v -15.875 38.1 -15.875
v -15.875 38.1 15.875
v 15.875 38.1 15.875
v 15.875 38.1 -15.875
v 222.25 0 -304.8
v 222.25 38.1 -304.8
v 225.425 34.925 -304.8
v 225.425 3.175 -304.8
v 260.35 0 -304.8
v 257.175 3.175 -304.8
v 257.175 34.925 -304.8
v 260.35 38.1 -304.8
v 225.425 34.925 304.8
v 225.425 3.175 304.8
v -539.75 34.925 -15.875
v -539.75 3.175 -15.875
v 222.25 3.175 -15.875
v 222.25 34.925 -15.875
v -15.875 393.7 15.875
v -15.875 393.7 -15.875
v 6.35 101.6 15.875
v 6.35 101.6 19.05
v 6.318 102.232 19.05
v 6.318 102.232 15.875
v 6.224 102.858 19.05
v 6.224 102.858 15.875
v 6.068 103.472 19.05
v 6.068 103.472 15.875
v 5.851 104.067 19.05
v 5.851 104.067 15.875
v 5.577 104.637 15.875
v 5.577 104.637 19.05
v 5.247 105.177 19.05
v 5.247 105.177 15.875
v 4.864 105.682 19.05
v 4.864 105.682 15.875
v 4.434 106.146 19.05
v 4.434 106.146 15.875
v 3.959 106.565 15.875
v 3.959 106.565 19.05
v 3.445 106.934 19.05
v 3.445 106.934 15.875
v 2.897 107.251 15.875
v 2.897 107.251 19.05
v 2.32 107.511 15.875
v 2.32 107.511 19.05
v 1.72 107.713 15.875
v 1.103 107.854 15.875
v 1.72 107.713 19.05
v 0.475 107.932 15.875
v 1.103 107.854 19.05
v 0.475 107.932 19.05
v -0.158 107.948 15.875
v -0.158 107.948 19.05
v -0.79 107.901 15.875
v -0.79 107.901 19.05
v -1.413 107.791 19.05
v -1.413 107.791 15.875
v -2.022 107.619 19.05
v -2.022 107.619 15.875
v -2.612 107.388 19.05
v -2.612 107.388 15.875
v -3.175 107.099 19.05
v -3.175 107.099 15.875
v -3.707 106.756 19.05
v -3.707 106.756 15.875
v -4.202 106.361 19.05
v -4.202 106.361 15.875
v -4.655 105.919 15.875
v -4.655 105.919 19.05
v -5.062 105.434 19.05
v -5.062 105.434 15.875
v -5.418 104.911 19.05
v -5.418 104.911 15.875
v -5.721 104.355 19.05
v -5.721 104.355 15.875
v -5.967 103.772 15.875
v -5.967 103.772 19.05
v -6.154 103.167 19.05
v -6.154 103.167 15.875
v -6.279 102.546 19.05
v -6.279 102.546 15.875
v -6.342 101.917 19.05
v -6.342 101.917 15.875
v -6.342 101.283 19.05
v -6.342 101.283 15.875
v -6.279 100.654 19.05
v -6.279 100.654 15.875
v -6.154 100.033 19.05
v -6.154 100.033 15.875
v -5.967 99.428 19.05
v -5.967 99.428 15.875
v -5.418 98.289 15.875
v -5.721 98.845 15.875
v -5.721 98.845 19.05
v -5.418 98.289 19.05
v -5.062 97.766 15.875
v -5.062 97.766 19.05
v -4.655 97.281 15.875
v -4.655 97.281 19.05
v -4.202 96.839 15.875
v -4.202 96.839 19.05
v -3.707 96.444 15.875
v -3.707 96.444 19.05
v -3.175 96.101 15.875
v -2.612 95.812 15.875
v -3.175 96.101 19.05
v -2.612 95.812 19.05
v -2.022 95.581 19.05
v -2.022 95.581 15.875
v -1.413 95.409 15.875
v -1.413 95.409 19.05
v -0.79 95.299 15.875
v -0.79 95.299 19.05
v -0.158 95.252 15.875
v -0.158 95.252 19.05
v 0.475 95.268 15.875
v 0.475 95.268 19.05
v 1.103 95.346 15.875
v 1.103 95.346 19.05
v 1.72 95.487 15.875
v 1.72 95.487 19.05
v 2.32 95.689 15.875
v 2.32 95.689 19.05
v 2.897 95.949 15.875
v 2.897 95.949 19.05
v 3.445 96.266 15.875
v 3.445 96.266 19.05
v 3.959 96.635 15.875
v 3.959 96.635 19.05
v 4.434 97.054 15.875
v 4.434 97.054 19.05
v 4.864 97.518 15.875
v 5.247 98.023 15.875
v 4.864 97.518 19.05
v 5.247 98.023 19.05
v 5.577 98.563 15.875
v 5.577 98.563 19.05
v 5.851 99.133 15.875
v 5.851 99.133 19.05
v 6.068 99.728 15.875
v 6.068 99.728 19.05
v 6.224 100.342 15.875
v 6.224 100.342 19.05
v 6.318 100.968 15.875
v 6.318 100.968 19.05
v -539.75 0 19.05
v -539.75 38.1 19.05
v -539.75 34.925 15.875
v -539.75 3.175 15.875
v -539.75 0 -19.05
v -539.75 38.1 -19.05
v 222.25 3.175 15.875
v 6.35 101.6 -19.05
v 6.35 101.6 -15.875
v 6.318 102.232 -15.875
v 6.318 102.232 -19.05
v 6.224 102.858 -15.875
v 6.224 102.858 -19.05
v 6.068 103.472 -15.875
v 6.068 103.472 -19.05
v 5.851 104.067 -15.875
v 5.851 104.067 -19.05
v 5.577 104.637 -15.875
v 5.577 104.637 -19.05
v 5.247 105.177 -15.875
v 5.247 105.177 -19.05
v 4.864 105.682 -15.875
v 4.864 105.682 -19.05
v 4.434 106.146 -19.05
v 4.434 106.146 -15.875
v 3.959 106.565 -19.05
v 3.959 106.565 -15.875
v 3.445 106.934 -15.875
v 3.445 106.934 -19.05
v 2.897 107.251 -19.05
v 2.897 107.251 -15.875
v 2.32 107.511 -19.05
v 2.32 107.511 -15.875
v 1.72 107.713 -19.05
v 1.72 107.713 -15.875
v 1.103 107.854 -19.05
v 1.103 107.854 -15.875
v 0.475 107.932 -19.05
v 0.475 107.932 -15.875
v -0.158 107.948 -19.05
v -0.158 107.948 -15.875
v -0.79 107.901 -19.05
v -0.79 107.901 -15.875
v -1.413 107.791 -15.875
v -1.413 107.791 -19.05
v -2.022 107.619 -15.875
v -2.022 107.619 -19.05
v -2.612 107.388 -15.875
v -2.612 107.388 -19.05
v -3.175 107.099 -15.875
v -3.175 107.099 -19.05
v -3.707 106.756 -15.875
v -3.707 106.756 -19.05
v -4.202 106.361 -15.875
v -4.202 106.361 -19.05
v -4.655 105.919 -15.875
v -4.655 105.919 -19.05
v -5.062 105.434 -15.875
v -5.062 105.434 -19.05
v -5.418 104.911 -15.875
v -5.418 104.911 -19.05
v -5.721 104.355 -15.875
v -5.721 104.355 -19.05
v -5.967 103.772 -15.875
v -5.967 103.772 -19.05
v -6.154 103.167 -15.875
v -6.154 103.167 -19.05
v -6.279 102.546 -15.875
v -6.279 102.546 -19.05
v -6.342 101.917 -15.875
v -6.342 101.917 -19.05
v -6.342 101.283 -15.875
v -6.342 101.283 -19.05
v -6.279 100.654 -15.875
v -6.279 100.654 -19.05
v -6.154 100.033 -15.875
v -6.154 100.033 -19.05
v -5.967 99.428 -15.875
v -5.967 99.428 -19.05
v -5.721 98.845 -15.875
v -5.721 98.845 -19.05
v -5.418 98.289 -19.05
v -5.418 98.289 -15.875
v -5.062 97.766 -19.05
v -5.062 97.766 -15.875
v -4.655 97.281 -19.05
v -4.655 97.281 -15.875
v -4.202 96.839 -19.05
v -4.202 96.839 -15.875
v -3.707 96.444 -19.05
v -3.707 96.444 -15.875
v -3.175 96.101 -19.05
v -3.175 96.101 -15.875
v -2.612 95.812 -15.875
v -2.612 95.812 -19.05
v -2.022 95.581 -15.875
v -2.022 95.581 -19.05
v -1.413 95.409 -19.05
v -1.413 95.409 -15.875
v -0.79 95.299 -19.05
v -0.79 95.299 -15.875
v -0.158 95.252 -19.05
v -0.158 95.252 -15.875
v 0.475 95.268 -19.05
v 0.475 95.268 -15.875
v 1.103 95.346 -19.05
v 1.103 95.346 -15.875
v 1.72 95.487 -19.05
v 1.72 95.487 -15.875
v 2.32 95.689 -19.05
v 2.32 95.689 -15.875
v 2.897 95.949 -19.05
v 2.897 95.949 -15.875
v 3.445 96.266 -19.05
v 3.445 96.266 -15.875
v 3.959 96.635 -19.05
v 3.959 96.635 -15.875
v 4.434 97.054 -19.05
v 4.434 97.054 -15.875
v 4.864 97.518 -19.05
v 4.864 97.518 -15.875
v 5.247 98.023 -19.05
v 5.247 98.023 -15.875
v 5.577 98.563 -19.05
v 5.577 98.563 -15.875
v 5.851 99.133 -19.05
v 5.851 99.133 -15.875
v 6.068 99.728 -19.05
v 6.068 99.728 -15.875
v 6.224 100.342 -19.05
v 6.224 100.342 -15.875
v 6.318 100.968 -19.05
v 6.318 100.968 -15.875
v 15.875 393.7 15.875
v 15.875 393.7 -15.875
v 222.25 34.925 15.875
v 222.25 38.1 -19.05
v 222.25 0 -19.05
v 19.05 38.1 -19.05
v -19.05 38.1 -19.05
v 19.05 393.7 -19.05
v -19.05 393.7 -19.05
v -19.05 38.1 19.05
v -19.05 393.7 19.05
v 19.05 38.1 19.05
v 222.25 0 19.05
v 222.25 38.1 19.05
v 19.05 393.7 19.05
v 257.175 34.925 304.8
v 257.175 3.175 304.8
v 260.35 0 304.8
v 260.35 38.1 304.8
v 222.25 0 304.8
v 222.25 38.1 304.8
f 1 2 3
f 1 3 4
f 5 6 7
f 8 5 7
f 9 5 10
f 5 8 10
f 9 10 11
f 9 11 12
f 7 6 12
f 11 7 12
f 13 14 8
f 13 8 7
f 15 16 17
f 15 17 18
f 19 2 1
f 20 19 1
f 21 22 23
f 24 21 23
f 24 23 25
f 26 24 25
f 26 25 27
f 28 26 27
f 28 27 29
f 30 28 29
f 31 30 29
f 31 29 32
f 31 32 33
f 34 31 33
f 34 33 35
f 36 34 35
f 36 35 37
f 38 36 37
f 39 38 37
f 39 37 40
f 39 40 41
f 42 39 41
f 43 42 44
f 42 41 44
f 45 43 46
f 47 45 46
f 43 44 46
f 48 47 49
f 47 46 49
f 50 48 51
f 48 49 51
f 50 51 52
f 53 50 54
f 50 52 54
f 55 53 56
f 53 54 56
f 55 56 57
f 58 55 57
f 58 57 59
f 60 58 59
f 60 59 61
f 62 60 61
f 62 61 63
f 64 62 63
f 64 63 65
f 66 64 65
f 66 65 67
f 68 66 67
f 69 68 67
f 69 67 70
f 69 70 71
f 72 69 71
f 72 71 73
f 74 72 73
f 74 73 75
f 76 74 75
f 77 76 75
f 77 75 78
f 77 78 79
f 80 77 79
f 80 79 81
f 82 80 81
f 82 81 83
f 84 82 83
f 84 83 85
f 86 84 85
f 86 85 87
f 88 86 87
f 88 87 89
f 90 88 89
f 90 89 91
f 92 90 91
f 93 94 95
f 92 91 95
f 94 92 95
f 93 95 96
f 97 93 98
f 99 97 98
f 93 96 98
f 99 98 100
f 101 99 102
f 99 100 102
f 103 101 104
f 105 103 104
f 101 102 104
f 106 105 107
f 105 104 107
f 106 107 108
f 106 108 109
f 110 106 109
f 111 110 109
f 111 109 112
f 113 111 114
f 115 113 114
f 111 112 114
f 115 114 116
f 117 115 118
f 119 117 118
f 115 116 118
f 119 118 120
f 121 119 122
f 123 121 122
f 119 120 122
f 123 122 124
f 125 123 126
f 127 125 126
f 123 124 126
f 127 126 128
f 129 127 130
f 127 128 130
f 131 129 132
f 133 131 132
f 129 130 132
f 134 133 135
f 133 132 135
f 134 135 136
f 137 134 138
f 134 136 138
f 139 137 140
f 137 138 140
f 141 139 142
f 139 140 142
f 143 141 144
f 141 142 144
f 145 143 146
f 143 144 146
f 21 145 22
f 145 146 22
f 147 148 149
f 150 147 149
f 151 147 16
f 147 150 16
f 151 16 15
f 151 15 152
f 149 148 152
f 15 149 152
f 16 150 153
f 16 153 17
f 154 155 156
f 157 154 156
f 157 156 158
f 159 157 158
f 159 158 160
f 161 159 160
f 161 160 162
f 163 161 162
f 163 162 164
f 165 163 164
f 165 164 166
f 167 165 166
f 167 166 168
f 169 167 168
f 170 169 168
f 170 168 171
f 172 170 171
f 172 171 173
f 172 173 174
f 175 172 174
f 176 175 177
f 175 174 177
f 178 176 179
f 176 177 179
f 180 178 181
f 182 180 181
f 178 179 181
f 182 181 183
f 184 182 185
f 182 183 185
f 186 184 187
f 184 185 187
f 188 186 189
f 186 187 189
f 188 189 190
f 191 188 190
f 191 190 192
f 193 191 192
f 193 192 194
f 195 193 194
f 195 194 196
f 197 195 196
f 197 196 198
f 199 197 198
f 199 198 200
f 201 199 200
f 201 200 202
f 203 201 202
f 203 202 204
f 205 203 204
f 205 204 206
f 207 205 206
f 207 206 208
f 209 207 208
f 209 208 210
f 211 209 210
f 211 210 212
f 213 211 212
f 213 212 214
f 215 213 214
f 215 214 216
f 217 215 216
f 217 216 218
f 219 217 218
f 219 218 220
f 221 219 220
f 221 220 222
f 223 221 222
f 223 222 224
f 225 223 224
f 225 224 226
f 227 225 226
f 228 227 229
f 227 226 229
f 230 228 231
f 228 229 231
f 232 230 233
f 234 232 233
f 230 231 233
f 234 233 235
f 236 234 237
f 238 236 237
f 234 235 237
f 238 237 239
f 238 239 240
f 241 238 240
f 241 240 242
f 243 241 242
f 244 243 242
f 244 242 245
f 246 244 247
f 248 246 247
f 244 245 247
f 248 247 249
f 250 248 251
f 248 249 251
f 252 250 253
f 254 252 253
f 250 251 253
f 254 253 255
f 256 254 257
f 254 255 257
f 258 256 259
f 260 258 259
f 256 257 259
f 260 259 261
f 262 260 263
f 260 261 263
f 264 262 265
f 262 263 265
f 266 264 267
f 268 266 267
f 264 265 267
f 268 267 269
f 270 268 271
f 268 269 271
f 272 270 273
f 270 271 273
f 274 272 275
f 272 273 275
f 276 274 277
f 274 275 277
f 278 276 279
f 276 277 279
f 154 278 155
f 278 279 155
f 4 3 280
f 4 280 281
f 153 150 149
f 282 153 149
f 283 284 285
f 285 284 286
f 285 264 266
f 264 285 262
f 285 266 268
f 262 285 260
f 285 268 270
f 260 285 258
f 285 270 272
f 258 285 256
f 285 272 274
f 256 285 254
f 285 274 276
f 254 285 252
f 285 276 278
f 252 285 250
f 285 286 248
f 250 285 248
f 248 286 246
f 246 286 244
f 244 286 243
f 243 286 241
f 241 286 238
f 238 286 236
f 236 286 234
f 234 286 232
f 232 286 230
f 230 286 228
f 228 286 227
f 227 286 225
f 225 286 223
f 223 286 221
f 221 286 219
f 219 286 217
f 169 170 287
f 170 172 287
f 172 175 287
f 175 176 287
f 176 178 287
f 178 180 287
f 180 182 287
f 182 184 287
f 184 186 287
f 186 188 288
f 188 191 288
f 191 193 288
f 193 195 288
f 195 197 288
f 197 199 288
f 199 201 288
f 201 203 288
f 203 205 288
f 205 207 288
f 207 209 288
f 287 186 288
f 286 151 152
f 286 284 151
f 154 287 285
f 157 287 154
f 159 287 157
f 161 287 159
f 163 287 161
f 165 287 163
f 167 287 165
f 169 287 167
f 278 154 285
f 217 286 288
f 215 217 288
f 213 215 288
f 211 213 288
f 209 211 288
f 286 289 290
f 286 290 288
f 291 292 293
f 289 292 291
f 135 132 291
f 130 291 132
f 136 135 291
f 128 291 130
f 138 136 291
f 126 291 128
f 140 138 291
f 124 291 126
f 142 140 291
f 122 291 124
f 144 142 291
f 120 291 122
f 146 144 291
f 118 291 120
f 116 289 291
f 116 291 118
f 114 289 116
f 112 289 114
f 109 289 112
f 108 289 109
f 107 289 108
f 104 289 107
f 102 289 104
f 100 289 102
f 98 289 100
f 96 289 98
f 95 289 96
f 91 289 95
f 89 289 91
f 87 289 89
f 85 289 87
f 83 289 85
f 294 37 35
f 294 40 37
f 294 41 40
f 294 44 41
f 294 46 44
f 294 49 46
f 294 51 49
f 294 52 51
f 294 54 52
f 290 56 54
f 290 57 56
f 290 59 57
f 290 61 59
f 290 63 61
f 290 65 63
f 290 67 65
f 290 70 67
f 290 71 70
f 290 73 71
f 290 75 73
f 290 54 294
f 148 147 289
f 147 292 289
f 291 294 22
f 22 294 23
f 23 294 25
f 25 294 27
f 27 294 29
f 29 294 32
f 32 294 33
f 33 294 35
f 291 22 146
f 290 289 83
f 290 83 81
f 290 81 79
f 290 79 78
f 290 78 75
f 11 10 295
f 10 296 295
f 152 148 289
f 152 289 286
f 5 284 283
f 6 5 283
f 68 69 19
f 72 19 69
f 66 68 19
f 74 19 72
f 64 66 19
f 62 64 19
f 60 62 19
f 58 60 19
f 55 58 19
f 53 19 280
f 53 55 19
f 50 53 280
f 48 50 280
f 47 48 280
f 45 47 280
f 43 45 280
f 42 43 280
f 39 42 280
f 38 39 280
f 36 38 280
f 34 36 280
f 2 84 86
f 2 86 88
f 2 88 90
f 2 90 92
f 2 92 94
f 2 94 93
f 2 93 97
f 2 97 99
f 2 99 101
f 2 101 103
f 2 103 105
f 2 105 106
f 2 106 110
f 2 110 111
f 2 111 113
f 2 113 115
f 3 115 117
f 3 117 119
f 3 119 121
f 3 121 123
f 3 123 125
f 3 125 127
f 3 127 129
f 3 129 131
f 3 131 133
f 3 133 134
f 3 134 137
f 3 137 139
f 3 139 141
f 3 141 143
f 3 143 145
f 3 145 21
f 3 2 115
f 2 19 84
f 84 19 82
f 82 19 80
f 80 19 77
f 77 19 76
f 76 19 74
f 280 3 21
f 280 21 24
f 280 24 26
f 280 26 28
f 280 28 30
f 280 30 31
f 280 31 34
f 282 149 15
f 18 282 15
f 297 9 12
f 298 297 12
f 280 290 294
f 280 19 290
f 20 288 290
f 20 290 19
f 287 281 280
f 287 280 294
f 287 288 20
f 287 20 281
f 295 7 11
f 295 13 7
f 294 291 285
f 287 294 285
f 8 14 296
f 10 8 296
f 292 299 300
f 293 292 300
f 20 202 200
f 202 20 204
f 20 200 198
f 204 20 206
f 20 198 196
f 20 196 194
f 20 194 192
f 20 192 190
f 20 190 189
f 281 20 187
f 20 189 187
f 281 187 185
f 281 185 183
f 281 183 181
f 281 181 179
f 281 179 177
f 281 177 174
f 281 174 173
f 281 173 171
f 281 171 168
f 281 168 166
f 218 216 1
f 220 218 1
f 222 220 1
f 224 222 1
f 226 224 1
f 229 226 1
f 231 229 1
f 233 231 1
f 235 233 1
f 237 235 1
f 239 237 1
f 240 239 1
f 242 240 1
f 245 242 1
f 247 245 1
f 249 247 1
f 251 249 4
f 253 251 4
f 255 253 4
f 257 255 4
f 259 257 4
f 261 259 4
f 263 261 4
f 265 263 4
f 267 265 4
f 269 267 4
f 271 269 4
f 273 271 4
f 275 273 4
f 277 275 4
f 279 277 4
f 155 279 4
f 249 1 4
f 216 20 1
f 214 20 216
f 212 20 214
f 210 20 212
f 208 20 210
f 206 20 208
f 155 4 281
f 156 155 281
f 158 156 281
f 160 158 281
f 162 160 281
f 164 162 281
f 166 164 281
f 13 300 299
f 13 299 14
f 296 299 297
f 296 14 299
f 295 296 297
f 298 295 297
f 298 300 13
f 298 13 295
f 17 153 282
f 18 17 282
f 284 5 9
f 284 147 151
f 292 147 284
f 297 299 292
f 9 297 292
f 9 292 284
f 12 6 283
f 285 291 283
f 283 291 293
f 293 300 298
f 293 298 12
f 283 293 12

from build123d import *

# Parameters (mm, degrees)
BOSS_EXTRUDE2_DEPTH      = 222.25
BOSS_EXTRUDE2_DEPTH_BACK = 539.75
SKETCH1_W                = 38.1
SKETCH1_H                = 38.1
SKETCH1_W_2              = 31.75
SKETCH1_H_2              = 31.75
SKETCH2_W                = 38.1
SKETCH2_H                = 38.1
SKETCH2_W_2              = 31.75
SKETCH2_H_2              = 31.75
BOSS_EXTRUDE3_DEPTH      = 355.6
SKETCH3_W                = 38.1
SKETCH3_H                = 38.1
SKETCH3_W_2              = 31.75
SKETCH3_H_2              = 31.75
BOSS_EXTRUDE4_DEPTH      = 304.8
SKETCH4_R                = 6.35
CUT_EXTRUDE1_DEPTH       = 743.434222676


with BuildPart() as part:
    # Sketch1 → Boss-Extrude2 (new, two sides: drawn at the far end of the back side and taken through both)
    with BuildSketch(Plane(origin=(0, 0, 0), x_dir=(0, 0, -1), z_dir=(1, 0, 0)).offset(-BOSS_EXTRUDE2_DEPTH_BACK)):
        with Locations((0, 19.05)):
            Rectangle(SKETCH1_W, SKETCH1_H)
        with Locations((0, 19.05)):
            Rectangle(SKETCH1_W_2, SKETCH1_H_2, mode=Mode.SUBTRACT)
    extrude(amount=BOSS_EXTRUDE2_DEPTH + BOSS_EXTRUDE2_DEPTH_BACK)

    # Sketch2 → Boss-Extrude3 (add)
    with BuildSketch(Plane(origin=(0, 38.1, 0), x_dir=(1, 0, 0), z_dir=(0, 1, 0))):
        Rectangle(SKETCH2_W, SKETCH2_H)
        Rectangle(SKETCH2_W_2, SKETCH2_H_2, mode=Mode.SUBTRACT)
    extrude(amount=BOSS_EXTRUDE3_DEPTH)

    # Sketch3 → Boss-Extrude4 (add, symmetric)
    with BuildSketch(Plane.XY):
        with Locations((241.3, 19.05)):
            Rectangle(SKETCH3_W, SKETCH3_H)
        with Locations((241.3, 19.05)):
            Rectangle(SKETCH3_W_2, SKETCH3_H_2, mode=Mode.SUBTRACT)
    extrude(amount=BOSS_EXTRUDE4_DEPTH, both=True)

    # Sketch4 → Cut-Extrude1 (cut, through all)
    with BuildSketch(Plane.XY.offset(19.05)):
        with Locations((0, 101.6)):
            Circle(SKETCH4_R)
    extrude(amount=-CUT_EXTRUDE1_DEPTH, mode=Mode.SUBTRACT)


solid = part.part
